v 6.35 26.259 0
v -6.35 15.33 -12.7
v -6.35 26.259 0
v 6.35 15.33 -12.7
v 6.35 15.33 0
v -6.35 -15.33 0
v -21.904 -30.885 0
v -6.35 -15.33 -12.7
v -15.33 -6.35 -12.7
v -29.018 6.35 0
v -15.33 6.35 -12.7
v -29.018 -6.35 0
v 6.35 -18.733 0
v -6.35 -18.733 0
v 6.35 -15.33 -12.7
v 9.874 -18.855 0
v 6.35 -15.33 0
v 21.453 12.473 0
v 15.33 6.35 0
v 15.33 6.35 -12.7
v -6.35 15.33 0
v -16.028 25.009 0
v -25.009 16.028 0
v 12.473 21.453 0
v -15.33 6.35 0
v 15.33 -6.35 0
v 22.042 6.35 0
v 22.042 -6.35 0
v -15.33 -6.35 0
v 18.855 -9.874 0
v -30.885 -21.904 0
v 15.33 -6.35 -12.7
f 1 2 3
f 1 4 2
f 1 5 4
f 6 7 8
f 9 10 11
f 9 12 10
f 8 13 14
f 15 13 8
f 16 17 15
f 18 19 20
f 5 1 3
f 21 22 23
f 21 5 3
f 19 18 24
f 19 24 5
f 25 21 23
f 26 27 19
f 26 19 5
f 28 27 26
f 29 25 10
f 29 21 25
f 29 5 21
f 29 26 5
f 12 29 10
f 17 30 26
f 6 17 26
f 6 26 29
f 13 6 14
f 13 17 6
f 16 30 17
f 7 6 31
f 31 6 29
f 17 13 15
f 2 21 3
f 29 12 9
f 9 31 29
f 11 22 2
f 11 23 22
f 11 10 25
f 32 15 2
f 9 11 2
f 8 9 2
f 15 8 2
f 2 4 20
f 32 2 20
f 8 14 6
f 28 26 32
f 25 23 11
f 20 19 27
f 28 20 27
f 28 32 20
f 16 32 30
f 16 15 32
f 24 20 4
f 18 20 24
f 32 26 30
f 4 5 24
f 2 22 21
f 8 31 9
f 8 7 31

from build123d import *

# Parameters (mm, degrees)
F1_DEPTH  = 12.7
F5_DEPTH  = 6.35
F7_DEPTH  = 6.35
F9_DEPTH  = 6.35
F11_DEPTH = 6.35
F13_DEPTH = 6.35
F15_DEPTH = 6.35
F17_DEPTH = 6.35
F19_DEPTH = 6.35


with BuildPart() as f1:
    # F0 (on Top) → F1 (new body)
    with BuildSketch(Plane.XY):
        Polygon((6.35, -15.3302561211), (15.3302561211, -6.35), (15.3302561211, 6.35), (6.35, 15.3302561211), (-6.35, 15.3302561211), (-15.3302561211, 6.35), (-15.3302561211, -6.35), (-6.35, -15.3302561211), align=None)
    extrude(amount=-F1_DEPTH)

    # F4 (on Right) → F5 (join, symmetric)
    with BuildSketch(Plane.YZ):
        Polygon((-15.3302561211, -12.7), (-15.3302561211, 0), (-18.7332108649, 0), align=None)
    extrude(amount=F5_DEPTH, both=True)

    # F6 (on mid) → F7 (join, symmetric)
    with BuildSketch(Plane(origin=(0, 0, 0), x_dir=(0.7071067812, -0.7071067812, 0), z_dir=(-0.7071067812, -0.7071067812, 0))):
        Polygon((20.314638822, 0), (15.3302561211, 0), (15.3302561211, -12.7), align=None)
    extrude(amount=F7_DEPTH, both=True)

    # F8 (on Front) → F9 (join, symmetric)
    with BuildSketch(Plane.XZ):
        Polygon((22.0424020951, 0), (15.3302561211, 0), (15.3302561211, -12.7), align=None)
    extrude(amount=F9_DEPTH, both=True)

    # F10 (on mid) → F11 (join, symmetric)
    with BuildSketch(Plane(origin=(0, 0, 0), x_dir=(0.7071067812, 0.7071067812, 0), z_dir=(0.7071067812, -0.7071067812, 0))):
        Polygon((23.9889695097, 0), (15.3302561211, 0), (15.3302561211, -12.7), align=None)
    extrude(amount=F11_DEPTH, both=True)

    # F12 (on Right) → F13 (join, symmetric)
    with BuildSketch(Plane.YZ):
        Polygon((26.2594898514, 0), (15.3302561211, 0), (15.3302561211, -12.7), align=None)
    extrude(amount=F13_DEPTH, both=True)

    # F14 (on mid) → F15 (join, symmetric)
    with BuildSketch(Plane(origin=(0, 0, 0), x_dir=(0.7071067812, -0.7071067812, 0), z_dir=(-0.7071067812, -0.7071067812, 0))):
        Polygon((-15.3302561211, -12.7), (-15.3302561211, 0), (-29.0176009017, 0), align=None)
    extrude(amount=F15_DEPTH, both=True)

    # F16 (on Front) → F17 (join, symmetric)
    with BuildSketch(Plane.XZ):
        Polygon((-15.3302561211, -12.7), (-15.3302561211, 0), (-29.0176009017, 0), align=None)
    extrude(amount=F17_DEPTH, both=True)

    # F18 (on mid) → F19 (join, symmetric)
    with BuildSketch(Plane(origin=(0, 0, 0), x_dir=(0.7071067812, 0.7071067812, 0), z_dir=(0.7071067812, -0.7071067812, 0))):
        Polygon((-15.3302561211, -12.7), (-15.3302561211, 0), (-37.3273013772, 0), align=None)
    extrude(amount=F19_DEPTH, both=True)


solid = f1.part
